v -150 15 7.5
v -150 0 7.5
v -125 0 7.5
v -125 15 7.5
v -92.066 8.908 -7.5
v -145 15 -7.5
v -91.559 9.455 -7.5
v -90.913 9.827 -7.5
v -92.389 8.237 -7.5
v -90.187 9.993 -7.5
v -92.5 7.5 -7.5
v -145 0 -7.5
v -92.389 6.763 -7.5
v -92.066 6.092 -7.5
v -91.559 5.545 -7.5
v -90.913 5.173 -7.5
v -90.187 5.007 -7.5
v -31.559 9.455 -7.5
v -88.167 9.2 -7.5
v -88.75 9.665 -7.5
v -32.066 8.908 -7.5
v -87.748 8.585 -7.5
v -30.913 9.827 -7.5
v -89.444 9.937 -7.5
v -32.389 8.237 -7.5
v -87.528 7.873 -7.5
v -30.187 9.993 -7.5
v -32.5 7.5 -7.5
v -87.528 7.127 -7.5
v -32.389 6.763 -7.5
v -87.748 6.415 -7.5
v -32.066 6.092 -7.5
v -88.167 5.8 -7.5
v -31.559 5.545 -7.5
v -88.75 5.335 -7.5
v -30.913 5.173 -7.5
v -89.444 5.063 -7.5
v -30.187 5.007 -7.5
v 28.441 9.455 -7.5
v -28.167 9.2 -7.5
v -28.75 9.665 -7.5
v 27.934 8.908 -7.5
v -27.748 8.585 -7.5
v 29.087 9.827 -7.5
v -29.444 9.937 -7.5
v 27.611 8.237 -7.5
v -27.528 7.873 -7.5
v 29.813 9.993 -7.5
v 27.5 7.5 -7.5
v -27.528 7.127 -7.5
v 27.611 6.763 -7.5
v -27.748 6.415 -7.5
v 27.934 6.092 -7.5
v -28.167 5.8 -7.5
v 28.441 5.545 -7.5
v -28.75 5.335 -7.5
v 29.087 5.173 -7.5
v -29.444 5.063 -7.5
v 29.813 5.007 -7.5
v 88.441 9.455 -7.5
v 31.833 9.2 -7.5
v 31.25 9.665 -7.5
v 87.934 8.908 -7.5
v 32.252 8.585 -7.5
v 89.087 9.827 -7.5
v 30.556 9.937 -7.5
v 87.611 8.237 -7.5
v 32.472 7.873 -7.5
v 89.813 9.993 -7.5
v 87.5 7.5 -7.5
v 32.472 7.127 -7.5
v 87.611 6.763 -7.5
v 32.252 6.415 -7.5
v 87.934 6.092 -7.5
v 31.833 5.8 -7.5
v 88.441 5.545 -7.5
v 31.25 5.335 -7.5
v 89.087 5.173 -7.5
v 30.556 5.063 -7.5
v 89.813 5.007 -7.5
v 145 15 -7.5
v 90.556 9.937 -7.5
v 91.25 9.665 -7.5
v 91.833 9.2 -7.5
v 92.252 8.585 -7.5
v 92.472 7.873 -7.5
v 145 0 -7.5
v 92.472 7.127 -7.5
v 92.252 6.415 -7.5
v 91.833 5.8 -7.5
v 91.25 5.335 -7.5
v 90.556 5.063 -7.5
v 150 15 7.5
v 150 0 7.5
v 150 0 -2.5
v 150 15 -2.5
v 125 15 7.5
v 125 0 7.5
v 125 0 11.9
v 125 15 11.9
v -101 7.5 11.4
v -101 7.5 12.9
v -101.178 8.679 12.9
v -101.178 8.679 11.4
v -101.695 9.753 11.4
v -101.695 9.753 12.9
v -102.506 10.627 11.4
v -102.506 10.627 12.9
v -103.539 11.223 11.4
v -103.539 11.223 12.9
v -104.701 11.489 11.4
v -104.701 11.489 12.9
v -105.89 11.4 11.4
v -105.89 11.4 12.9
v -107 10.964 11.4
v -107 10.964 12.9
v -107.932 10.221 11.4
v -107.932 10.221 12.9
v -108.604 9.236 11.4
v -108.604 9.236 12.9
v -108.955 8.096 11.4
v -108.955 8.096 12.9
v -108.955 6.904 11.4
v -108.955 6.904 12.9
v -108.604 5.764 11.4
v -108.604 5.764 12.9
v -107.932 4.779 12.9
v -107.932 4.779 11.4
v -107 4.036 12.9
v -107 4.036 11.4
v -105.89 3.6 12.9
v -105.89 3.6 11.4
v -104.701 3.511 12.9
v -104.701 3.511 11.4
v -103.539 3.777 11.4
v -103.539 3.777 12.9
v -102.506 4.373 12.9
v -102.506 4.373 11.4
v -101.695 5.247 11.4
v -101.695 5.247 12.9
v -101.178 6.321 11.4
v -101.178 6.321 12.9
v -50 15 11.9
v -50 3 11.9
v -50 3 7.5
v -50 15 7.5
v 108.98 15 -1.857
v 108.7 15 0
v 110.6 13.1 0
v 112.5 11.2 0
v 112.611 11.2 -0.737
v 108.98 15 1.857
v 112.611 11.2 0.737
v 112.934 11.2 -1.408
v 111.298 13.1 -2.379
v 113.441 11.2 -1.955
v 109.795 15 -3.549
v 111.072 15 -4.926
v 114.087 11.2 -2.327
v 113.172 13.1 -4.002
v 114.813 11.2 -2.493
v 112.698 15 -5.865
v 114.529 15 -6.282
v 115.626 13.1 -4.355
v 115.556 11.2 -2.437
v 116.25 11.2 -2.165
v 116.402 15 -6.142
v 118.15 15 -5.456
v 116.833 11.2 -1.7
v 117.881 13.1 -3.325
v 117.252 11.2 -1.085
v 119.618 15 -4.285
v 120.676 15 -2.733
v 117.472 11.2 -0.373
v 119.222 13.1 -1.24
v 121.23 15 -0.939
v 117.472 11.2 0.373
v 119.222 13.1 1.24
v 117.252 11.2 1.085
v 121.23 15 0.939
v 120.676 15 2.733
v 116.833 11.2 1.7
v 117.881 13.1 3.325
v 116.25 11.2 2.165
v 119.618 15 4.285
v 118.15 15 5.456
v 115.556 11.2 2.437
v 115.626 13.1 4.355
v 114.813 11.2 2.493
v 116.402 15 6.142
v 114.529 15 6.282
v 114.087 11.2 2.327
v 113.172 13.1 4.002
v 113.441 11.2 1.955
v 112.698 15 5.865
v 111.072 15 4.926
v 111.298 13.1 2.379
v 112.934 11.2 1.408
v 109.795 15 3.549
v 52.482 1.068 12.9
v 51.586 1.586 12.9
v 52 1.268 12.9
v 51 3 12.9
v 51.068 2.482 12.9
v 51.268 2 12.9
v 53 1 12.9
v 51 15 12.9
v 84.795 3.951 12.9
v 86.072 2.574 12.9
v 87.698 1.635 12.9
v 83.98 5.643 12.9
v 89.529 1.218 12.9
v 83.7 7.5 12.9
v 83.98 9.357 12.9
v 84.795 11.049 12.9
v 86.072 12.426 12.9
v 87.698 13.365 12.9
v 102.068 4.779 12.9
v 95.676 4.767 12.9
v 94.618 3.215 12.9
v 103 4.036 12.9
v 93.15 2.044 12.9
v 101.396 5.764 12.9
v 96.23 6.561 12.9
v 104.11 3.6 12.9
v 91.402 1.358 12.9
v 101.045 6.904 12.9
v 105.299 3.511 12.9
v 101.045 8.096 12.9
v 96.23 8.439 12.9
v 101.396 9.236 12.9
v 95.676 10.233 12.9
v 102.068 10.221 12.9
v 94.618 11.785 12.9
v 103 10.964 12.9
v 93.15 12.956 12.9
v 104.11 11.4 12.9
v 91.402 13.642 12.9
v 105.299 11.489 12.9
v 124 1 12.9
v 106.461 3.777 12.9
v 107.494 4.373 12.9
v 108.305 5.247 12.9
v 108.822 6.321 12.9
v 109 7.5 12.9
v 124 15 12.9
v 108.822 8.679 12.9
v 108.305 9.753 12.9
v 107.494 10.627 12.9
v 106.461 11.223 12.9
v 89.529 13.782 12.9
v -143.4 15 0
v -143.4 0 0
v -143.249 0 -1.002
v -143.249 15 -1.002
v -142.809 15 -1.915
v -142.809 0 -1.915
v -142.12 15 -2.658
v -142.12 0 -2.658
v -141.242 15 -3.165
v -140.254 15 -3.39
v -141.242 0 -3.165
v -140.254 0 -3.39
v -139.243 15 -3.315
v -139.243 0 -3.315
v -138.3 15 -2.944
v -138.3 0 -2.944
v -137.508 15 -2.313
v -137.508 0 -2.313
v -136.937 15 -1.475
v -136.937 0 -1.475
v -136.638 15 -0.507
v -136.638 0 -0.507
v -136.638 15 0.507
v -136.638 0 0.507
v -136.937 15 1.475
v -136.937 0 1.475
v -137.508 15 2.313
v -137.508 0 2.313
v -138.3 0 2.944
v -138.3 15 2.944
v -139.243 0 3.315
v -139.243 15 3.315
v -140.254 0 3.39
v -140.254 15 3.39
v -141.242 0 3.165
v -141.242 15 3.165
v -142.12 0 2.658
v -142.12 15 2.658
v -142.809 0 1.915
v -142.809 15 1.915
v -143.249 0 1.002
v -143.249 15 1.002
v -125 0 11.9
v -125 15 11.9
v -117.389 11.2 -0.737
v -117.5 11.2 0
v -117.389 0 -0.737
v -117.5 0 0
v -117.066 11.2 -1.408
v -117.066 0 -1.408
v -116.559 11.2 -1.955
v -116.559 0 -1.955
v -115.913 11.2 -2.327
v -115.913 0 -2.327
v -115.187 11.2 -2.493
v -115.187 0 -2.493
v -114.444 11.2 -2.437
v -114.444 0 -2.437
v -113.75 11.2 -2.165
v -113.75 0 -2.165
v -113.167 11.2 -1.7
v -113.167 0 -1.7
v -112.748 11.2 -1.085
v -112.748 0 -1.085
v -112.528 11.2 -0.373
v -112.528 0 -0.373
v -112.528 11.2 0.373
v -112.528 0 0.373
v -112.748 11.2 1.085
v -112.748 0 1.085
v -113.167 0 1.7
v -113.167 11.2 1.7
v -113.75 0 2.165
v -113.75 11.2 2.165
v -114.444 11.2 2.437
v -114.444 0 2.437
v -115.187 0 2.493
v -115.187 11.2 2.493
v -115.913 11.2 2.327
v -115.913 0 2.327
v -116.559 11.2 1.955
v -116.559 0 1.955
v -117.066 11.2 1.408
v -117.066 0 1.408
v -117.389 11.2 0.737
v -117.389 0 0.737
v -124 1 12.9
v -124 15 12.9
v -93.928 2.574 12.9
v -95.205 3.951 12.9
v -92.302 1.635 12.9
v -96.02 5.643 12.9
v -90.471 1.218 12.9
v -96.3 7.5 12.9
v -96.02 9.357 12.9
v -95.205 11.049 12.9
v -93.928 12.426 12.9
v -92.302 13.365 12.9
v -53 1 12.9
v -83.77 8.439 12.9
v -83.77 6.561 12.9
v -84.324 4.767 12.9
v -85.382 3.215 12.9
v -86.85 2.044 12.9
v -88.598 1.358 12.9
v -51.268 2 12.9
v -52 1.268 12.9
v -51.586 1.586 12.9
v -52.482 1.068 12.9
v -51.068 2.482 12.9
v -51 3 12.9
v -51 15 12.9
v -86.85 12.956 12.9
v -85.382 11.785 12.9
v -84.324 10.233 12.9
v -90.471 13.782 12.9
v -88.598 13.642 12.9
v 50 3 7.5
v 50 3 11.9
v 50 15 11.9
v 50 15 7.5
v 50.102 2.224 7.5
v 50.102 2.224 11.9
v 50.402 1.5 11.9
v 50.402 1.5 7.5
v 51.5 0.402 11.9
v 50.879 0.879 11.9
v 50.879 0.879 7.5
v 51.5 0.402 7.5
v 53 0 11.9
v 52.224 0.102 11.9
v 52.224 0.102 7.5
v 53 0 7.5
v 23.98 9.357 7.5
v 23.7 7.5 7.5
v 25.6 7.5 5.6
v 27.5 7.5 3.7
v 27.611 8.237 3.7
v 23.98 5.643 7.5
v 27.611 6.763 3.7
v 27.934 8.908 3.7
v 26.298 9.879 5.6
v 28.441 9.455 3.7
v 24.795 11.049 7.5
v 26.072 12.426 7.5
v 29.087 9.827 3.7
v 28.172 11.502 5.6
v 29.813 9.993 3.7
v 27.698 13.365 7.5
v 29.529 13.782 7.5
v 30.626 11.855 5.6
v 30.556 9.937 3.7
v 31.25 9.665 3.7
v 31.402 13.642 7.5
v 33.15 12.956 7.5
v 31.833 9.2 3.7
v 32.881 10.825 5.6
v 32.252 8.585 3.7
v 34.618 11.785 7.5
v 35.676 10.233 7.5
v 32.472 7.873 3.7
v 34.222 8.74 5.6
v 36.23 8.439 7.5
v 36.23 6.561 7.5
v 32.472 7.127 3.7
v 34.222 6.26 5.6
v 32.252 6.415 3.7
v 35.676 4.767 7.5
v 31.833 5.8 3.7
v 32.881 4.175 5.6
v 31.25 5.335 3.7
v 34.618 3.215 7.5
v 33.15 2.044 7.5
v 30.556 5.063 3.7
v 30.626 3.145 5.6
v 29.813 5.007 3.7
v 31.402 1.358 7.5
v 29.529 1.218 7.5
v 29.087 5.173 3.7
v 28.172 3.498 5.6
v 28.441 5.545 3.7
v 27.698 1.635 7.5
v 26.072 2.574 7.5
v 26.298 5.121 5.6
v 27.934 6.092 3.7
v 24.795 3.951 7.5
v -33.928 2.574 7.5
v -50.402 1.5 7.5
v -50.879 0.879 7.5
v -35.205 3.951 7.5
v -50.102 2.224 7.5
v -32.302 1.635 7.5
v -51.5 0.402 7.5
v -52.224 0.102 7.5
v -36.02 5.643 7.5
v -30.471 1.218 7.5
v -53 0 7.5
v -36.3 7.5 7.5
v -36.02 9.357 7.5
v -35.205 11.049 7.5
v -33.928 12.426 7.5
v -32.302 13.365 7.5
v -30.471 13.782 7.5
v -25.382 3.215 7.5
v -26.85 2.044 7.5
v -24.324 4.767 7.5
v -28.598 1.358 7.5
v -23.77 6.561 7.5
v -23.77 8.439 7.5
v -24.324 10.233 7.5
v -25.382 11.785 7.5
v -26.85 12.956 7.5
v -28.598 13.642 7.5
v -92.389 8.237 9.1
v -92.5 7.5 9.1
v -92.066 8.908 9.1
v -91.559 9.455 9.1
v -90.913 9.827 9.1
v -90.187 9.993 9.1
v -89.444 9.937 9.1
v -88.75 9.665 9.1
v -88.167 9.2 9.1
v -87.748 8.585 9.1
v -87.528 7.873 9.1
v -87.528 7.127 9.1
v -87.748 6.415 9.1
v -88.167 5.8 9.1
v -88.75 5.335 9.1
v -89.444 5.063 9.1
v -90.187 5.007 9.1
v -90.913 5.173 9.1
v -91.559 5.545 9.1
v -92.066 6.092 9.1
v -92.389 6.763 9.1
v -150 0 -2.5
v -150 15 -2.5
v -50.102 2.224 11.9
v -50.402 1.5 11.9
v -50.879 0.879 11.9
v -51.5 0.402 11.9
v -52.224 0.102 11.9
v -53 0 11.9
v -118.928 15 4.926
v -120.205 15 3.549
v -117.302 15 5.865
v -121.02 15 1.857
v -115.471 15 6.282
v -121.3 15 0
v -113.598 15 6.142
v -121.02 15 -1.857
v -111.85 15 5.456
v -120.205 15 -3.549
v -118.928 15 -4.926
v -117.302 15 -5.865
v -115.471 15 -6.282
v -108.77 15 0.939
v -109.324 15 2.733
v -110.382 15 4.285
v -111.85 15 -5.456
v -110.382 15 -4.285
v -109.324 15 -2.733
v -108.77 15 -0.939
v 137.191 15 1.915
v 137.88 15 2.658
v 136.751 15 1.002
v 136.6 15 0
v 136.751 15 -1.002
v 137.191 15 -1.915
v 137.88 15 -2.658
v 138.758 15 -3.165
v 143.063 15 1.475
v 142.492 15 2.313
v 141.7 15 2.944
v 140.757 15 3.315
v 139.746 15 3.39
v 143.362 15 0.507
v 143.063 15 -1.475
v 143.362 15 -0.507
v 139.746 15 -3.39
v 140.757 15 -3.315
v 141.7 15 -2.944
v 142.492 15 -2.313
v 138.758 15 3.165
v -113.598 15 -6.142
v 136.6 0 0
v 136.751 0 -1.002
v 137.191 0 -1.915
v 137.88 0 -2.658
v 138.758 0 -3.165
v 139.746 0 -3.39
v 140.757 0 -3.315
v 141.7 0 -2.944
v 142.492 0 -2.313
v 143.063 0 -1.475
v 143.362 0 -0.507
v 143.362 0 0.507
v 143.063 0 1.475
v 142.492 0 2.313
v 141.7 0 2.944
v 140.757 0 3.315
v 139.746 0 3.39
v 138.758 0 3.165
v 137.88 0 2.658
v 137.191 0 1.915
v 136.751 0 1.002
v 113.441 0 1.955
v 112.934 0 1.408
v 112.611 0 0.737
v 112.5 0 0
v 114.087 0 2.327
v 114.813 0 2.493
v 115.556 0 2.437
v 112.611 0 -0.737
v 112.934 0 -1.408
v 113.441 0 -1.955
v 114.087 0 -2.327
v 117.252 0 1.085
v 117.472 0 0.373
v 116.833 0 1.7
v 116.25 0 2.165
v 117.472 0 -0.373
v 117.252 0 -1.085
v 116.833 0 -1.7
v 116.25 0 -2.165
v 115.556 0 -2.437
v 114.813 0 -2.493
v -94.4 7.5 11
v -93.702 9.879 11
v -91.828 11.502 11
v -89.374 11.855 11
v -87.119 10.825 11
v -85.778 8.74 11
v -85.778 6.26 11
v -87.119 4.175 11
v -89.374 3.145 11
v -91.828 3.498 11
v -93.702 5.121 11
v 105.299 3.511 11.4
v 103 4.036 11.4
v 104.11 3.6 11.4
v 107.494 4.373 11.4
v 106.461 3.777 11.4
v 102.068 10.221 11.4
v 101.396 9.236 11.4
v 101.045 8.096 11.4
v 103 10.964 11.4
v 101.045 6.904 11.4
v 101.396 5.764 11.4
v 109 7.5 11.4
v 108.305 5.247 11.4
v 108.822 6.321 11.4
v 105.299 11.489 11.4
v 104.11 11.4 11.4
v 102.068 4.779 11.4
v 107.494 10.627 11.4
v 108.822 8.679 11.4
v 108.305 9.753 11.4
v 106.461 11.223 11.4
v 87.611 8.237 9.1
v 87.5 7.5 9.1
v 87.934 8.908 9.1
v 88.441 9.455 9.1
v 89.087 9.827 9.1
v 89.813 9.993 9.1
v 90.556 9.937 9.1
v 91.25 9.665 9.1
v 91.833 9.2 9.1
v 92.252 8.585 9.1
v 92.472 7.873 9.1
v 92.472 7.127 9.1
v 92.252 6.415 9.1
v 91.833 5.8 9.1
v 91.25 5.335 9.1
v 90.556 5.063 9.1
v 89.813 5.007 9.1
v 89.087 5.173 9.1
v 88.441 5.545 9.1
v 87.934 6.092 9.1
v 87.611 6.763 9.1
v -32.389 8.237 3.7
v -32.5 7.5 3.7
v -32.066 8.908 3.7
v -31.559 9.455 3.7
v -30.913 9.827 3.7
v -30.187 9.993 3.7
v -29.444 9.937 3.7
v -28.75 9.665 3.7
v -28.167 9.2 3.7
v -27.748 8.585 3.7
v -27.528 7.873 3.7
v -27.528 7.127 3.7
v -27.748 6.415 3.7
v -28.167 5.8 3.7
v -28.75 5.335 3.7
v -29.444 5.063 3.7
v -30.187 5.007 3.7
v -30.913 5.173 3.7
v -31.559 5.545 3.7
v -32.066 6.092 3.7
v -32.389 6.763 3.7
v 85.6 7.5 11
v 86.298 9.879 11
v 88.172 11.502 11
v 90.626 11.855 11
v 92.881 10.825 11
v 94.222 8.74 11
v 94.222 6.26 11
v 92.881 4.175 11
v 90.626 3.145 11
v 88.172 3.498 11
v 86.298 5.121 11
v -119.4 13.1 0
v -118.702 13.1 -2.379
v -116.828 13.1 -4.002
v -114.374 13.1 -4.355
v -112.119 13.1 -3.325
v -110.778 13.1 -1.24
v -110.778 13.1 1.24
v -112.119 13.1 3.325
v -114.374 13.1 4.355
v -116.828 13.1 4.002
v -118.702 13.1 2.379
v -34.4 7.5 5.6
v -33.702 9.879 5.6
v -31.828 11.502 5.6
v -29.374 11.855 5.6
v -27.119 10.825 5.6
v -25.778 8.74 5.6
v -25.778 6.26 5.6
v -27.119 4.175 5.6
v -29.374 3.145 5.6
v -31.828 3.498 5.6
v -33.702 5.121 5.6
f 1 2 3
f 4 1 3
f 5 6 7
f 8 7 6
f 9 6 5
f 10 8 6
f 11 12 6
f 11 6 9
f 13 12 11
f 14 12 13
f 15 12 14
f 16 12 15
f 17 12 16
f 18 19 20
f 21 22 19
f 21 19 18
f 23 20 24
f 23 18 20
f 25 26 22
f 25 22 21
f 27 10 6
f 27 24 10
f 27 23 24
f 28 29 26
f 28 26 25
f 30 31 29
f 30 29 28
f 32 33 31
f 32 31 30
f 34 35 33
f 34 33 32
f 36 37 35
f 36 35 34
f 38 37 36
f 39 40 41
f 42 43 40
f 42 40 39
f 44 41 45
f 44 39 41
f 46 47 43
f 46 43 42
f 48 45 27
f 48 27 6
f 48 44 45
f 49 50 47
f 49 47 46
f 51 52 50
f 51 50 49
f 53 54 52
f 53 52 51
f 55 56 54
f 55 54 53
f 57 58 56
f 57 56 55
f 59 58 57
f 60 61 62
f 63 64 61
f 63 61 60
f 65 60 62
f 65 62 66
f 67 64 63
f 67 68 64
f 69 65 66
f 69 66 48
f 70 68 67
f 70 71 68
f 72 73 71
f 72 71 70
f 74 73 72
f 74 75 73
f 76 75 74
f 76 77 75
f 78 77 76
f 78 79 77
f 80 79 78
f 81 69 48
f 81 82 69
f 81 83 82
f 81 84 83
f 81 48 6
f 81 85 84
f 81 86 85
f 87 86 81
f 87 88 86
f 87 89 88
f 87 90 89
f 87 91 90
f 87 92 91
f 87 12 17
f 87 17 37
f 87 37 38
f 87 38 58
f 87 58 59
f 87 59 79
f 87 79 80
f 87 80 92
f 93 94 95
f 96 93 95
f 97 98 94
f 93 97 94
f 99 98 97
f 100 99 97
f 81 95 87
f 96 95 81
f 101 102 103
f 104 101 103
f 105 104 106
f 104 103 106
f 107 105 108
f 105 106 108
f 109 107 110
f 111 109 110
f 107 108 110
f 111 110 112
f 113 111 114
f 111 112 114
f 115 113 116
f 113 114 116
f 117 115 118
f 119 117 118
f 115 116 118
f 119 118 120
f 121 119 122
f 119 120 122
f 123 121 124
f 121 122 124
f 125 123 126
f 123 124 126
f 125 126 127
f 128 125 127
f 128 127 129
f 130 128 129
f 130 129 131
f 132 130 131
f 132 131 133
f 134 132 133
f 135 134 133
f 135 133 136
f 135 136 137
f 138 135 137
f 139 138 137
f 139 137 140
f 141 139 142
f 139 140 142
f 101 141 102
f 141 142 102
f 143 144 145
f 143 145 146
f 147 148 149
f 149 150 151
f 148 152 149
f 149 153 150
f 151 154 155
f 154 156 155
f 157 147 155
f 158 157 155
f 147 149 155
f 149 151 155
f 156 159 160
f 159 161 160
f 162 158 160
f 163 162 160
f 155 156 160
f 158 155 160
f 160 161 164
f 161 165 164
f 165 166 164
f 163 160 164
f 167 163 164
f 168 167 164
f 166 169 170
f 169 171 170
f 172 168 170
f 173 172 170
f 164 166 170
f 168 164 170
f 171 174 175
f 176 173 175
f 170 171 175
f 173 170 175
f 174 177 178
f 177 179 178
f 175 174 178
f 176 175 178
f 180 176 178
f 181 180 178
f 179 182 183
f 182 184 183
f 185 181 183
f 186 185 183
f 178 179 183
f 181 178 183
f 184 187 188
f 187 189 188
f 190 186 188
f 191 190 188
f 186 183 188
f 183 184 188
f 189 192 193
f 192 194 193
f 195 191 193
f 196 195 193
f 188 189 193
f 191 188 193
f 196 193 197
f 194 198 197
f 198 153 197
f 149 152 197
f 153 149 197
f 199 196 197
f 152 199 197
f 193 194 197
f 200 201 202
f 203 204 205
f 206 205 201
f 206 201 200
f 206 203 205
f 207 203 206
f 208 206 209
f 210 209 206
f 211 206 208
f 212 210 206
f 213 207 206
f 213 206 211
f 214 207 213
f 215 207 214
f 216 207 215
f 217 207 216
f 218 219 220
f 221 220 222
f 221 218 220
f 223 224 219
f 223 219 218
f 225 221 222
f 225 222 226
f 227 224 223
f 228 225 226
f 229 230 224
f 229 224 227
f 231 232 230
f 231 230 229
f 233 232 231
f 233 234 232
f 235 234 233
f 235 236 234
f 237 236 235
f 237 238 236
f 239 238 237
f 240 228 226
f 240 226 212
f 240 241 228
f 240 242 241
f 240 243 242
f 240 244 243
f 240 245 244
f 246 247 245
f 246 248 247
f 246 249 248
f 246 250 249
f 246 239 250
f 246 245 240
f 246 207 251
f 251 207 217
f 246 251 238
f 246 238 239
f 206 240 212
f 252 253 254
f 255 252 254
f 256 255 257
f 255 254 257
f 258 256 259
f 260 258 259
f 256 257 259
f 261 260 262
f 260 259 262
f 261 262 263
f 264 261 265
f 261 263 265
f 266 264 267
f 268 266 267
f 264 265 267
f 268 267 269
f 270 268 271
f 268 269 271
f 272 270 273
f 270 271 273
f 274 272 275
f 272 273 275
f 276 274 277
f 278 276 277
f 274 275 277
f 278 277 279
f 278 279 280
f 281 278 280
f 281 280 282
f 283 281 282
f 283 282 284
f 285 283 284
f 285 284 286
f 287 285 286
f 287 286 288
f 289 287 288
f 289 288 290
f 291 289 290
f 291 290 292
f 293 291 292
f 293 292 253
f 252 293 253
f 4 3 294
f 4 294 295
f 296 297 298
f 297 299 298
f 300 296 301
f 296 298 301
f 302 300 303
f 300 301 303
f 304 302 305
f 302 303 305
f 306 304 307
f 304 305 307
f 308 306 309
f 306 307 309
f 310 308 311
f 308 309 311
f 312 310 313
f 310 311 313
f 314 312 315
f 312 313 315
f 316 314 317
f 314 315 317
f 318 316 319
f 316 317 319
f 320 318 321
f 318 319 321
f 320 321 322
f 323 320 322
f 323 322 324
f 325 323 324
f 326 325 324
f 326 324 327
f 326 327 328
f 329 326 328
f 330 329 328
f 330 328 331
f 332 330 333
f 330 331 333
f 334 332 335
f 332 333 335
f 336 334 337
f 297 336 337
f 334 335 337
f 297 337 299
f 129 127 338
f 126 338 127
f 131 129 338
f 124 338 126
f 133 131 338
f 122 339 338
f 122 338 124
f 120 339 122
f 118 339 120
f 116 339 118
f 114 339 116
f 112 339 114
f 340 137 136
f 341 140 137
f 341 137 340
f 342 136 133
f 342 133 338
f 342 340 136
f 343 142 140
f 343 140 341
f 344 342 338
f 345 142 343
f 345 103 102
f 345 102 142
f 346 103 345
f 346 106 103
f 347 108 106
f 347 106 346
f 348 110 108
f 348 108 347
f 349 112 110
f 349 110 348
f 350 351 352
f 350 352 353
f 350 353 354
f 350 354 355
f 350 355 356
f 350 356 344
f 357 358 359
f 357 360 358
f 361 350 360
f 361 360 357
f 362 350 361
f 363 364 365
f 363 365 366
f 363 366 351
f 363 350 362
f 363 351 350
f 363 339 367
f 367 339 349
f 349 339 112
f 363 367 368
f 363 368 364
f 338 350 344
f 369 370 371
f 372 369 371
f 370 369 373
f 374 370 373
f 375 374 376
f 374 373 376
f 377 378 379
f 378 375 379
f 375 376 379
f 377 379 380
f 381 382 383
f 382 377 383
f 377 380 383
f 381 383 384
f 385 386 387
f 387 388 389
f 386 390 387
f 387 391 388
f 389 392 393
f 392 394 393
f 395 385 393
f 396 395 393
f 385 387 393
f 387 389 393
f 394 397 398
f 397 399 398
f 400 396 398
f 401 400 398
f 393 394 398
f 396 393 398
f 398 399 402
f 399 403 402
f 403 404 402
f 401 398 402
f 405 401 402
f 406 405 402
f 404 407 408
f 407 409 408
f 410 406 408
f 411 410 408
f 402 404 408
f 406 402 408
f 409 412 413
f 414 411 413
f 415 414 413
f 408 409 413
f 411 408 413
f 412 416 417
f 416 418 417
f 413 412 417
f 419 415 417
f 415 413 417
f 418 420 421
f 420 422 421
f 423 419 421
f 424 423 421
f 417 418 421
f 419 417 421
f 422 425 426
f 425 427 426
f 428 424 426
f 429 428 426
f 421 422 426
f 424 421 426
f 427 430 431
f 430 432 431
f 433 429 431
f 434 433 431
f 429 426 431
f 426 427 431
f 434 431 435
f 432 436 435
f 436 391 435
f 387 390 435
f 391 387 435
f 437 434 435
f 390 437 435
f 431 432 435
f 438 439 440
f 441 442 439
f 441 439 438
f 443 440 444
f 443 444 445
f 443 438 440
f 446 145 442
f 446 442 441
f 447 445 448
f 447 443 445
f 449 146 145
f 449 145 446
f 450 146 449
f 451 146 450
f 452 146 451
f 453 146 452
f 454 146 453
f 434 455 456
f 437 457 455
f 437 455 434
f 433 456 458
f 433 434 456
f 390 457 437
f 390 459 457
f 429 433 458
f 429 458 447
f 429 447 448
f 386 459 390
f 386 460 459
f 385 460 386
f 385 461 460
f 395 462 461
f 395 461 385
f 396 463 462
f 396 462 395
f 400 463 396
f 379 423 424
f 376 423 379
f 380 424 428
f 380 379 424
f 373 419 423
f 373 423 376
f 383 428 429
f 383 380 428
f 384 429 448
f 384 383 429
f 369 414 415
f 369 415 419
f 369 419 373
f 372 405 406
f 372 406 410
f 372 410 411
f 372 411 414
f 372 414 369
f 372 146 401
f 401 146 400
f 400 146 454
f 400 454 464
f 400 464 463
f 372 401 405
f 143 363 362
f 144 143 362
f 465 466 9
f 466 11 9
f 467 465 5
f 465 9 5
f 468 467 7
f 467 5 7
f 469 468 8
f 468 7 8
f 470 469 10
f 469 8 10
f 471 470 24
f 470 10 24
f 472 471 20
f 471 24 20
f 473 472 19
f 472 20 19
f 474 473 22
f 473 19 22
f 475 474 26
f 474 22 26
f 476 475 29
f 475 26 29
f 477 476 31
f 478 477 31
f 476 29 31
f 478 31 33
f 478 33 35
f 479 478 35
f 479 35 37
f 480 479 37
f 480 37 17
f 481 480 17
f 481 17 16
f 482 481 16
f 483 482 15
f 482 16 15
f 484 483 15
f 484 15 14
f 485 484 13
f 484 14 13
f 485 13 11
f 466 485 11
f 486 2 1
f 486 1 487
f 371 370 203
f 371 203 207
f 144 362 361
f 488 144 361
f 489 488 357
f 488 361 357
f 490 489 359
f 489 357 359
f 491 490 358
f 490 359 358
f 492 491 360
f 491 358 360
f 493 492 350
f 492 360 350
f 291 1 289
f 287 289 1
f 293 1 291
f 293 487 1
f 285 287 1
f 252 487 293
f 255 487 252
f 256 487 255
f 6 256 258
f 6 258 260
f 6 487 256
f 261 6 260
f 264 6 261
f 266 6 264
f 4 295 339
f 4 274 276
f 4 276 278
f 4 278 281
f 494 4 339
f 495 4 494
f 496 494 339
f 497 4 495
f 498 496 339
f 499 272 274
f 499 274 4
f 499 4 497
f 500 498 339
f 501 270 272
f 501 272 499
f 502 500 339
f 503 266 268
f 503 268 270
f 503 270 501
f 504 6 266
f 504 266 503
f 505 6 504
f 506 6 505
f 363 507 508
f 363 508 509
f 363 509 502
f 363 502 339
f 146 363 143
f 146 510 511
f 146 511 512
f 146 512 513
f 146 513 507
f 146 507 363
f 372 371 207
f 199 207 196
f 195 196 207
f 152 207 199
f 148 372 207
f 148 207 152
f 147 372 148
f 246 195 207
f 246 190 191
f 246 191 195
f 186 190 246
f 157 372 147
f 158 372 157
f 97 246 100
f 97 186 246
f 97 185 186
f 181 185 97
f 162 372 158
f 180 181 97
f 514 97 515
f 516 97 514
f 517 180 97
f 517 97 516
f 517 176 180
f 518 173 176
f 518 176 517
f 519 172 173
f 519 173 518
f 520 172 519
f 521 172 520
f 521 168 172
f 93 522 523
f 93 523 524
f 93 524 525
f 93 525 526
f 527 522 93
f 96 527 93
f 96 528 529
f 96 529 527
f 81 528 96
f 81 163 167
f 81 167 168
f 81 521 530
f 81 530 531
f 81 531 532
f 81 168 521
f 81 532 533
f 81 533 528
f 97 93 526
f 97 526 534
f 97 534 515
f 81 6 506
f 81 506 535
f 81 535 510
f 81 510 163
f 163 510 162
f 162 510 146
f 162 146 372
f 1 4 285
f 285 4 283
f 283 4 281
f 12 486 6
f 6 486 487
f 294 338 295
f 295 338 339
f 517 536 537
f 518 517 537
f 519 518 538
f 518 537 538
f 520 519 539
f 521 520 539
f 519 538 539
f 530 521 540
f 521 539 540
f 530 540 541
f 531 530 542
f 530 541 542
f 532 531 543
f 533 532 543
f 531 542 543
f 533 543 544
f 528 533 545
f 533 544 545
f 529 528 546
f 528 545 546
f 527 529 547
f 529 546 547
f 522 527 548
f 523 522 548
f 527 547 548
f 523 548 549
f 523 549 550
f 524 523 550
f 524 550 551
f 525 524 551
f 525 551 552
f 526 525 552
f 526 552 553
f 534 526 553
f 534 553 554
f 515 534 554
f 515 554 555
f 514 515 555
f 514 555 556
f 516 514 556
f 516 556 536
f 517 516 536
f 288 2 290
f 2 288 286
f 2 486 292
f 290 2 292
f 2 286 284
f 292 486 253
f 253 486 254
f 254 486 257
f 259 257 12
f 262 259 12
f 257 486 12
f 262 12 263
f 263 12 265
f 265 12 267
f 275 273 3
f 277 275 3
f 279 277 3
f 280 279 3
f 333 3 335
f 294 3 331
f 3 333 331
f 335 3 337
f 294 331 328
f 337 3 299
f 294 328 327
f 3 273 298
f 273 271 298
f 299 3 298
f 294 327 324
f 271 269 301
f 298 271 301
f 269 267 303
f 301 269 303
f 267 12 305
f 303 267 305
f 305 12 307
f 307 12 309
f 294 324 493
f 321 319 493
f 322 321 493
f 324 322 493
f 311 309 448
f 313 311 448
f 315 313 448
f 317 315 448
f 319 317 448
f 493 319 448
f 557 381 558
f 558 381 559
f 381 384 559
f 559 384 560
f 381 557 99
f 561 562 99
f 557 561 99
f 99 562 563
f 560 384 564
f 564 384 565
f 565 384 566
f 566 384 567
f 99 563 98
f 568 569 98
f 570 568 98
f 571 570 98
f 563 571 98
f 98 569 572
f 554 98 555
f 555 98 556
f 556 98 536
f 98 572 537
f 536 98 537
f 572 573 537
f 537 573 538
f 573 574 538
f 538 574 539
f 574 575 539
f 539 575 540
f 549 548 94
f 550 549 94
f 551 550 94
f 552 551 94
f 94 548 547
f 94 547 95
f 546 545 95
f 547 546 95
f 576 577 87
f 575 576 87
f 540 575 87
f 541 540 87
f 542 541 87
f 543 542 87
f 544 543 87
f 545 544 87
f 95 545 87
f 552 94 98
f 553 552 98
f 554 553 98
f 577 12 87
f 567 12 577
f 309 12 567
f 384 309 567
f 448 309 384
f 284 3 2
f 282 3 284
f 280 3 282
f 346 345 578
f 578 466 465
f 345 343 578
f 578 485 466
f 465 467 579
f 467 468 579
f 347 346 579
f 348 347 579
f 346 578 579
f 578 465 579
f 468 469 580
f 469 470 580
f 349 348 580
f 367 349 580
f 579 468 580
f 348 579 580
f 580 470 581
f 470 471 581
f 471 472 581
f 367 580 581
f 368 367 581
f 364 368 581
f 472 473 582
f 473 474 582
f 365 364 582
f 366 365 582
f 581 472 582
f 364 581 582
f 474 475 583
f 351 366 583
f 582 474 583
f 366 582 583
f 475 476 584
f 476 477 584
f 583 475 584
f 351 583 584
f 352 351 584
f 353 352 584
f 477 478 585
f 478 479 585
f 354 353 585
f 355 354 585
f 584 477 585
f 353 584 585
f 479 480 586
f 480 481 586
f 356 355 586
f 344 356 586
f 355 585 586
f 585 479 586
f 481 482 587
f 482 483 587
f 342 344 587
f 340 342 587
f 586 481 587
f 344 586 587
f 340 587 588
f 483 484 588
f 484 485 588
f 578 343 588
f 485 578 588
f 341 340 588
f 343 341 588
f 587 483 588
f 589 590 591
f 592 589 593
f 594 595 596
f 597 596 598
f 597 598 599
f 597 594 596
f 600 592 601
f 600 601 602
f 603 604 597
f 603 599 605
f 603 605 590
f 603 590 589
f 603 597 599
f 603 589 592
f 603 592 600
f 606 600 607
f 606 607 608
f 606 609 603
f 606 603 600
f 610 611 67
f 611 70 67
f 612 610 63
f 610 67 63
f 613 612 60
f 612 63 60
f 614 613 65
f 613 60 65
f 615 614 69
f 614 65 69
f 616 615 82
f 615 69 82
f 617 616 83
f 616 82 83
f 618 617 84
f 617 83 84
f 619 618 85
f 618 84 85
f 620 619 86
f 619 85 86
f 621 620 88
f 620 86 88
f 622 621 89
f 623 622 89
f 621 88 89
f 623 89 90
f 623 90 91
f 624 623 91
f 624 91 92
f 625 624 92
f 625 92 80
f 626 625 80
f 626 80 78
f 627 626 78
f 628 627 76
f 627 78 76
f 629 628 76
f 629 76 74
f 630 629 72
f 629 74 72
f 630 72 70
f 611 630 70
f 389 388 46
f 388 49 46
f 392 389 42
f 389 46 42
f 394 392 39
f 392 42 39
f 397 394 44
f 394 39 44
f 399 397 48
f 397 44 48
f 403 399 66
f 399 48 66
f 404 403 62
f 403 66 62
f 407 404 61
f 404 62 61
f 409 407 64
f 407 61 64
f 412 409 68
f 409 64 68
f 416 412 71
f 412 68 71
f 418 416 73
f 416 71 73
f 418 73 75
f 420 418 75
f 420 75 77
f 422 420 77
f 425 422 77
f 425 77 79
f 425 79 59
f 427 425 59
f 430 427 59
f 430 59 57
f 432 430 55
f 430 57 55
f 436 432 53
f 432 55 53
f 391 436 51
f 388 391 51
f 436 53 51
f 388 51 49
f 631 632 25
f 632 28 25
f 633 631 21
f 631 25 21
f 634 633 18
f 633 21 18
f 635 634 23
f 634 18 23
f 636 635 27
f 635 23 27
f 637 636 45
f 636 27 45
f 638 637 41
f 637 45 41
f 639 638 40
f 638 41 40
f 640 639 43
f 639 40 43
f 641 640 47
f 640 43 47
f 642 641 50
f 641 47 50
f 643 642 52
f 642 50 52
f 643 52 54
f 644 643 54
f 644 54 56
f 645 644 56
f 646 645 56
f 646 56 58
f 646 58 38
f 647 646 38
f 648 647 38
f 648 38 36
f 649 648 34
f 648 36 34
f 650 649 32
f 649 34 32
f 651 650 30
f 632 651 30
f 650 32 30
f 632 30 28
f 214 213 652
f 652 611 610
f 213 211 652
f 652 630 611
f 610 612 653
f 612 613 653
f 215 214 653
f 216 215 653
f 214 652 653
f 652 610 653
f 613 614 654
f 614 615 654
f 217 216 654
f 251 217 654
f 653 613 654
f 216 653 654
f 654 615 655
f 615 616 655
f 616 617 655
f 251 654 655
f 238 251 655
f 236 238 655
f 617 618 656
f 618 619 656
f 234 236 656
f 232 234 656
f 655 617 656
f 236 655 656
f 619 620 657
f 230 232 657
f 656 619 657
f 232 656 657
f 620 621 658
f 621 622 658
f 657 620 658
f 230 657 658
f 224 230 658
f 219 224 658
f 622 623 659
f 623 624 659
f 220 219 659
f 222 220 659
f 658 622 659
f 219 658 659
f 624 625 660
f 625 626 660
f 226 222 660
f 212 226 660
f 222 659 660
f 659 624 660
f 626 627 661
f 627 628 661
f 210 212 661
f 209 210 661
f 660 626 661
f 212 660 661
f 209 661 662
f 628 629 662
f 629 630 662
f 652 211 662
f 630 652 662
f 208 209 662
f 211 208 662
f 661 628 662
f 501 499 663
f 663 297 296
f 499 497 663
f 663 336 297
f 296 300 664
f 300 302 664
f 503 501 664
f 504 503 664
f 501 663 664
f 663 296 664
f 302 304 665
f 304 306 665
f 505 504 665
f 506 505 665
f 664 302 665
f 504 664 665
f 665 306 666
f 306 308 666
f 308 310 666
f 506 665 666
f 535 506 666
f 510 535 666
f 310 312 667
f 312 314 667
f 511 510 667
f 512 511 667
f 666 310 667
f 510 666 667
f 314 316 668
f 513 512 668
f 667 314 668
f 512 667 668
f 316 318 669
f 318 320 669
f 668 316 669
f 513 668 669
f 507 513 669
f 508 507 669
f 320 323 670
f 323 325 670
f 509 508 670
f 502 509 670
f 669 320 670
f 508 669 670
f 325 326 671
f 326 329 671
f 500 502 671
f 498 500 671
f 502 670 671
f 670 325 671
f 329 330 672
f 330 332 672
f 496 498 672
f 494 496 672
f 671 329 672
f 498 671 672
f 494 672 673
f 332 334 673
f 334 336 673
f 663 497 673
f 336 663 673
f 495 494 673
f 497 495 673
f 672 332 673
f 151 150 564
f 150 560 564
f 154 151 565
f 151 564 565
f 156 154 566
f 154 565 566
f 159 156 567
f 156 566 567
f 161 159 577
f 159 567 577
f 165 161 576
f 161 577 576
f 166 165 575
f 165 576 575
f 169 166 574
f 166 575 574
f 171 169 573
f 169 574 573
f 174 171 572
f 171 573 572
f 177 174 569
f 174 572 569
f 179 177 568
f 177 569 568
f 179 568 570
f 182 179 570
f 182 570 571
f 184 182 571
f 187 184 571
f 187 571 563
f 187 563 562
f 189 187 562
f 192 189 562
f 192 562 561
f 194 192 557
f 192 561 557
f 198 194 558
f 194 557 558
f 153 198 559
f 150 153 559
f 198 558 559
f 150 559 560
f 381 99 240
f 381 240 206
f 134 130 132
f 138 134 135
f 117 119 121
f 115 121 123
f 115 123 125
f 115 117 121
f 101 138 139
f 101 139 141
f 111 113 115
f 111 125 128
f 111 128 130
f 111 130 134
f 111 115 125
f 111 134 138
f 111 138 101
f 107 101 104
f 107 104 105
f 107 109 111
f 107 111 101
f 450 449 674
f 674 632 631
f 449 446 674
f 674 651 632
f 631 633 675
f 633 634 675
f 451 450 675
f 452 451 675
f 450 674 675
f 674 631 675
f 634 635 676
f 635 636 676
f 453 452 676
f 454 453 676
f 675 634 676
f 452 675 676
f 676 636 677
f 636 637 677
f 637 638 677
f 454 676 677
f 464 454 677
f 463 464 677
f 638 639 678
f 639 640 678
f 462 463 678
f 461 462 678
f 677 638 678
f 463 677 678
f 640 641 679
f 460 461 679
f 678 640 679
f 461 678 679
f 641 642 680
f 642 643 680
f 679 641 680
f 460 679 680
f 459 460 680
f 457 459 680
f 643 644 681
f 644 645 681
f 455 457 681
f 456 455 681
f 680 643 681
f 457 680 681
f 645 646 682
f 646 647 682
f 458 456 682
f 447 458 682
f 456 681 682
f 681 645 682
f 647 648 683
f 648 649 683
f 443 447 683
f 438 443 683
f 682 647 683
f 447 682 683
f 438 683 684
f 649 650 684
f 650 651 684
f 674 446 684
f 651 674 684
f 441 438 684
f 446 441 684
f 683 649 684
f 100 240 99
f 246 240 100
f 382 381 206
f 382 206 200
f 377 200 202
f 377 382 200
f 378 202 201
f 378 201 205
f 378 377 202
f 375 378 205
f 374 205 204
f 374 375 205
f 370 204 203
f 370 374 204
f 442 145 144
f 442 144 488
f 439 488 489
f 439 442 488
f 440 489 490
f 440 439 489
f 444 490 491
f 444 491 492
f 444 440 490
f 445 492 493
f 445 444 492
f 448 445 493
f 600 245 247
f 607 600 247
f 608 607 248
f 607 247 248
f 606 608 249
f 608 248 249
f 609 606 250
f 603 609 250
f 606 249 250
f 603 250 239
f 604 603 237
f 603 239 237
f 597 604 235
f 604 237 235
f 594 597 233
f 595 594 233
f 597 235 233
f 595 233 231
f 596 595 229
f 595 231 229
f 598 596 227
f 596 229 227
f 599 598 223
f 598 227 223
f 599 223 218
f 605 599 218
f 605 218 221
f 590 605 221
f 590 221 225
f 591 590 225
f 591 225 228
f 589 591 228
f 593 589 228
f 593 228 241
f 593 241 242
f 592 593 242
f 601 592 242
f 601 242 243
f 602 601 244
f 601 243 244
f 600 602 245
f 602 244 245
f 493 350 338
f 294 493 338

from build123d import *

# Parameters (mm, degrees)
SKETCH_1_W                   = 300
SKETCH_1_H                   = 15
EXTRUDE_349_DEPTH            = 15
HOLE_WIZARD_M6_D             = 5
HOLE_WIZARD_M6_CSINK_D       = 12.6
HOLE_WIZARD_M6_CSINK_ANGLE   = 90
HOLE_WIZARD_M8_D             = 6.8
SKETCH_8_W                   = 250
SKETCH_8_H                   = 15
EXTRUDE_2463_DEPTH           = 5.4
SKETCH_9_R                   = 4
CUT_EXTRUDE_2783_DEPTH       = 1.5
SKETCH_10_W                  = 100
SKETCH_10_H                  = 15
CUT_EXTRUDE_3071_DEPTH       = 5.4
HOLE_WIZARD_1_M6_D           = 5
HOLE_WIZARD_1_M6_CSINK_D     = 12.6
HOLE_WIZARD_1_M6_CSINK_ANGLE = 90
HOLE_WIZARD_2_M6_D           = 5
HOLE_WIZARD_2_M6_CSINK_D     = 12.6
HOLE_WIZARD_2_M6_CSINK_ANGLE = 90
FILLET_1_R                   = 3
CHAMFER_1_SIZE               = 5
CHAMFER_2_SIZE               = 1


with BuildPart() as part:
    # Эскиз1 → Extrude 349 (new body)
    with BuildSketch(Plane(origin=(0, 0, 0), x_dir=(1, 0, 0), z_dir=(0, 1, 0))):
        Rectangle(SKETCH_1_W, SKETCH_1_H)
    extrude(amount=EXTRUDE_349_DEPTH)

    # Крепление шарнира M6 (through all)
    with Locations(Plane(origin=(0, 15, 0), x_dir=(1, 0, 0), z_dir=(0, 1, 0))):
        with Locations((-115, 0), (115, 0)):
            CounterSinkHole(HOLE_WIZARD_M6_D / 2, HOLE_WIZARD_M6_CSINK_D / 2, counter_sink_angle=HOLE_WIZARD_M6_CSINK_ANGLE)

    # Шпилька-M8 (through all)
    with Locations(Plane(origin=(0, 15, 0), x_dir=(1, 0, 0), z_dir=(0, 1, 0))):
        with Locations((-140, 0), (140, 0)):
            Hole(HOLE_WIZARD_M8_D / 2)

    # Эскиз8 → Extrude 2463 (add)
    with BuildSketch(Plane.XY.offset(7.5)):
        with Locations((0, 7.5)):
            Rectangle(SKETCH_8_W, SKETCH_8_H)
    extrude(amount=EXTRUDE_2463_DEPTH)

    # Эскиз9 → Cut-Extrude 2783 (cut)
    with BuildSketch(Plane.XY.offset(12.9)):
        with Locations((-105, 7.5)):
            Circle(SKETCH_9_R)
        with Locations((105, 7.5)):
            Circle(SKETCH_9_R)
    extrude(amount=-CUT_EXTRUDE_2783_DEPTH, mode=Mode.SUBTRACT)

    # Эскиз10 → Cut-Extrude 3071 (cut)
    with BuildSketch(Plane.XY.offset(12.9)):
        with Locations((0, 7.5)):
            Rectangle(SKETCH_10_W, SKETCH_10_H)
    extrude(amount=-CUT_EXTRUDE_3071_DEPTH, mode=Mode.SUBTRACT)

    # Прижим-1-M6 (through all)
    with Locations(Plane.XY.offset(12.9)):
        with Locations((-90, 7.5), (90, 7.5)):
            CounterSinkHole(HOLE_WIZARD_1_M6_D / 2, HOLE_WIZARD_1_M6_CSINK_D / 2, counter_sink_angle=HOLE_WIZARD_1_M6_CSINK_ANGLE)

    # Прижим-2-M6 (through all)
    with Locations(Plane.XY.offset(7.5)):
        with Locations((-30, 7.5), (30, 7.5)):
            CounterSinkHole(HOLE_WIZARD_2_M6_D / 2, HOLE_WIZARD_2_M6_CSINK_D / 2, counter_sink_angle=HOLE_WIZARD_2_M6_CSINK_ANGLE)

    # Скругление1
    fillet_1_edges = [part.edges().sort_by_distance(p)[0] for p in [
        (-50, 0, 10.2),
        (50, 0, 10.2),
    ]]
    fillet(fillet_1_edges, radius=FILLET_1_R)

    # Фаска1
    chamfer_1_edges = [part.edges().sort_by_distance(p)[0] for p in [
        (-150, 7.5, -7.5),
        (150, 7.5, -7.5),
    ]]
    chamfer(chamfer_1_edges, length=CHAMFER_1_SIZE)

    # Фаска2
    chamfer_2_edges = [part.edges().sort_by_distance(p)[0] for p in [
        (-50.878679656, 0.878679656, 12.9),
        (-125, 7.5, 12.9),
        (-89, 0, 12.9),
        (125, 7.5, 12.9),
        (-50, 9, 12.9),
        (50, 9, 12.9),
        (89, 0, 12.9),
        (50.878679656, 0.878679656, 12.9),
    ]]
    chamfer(chamfer_2_edges, length=CHAMFER_2_SIZE)


solid = part.part
